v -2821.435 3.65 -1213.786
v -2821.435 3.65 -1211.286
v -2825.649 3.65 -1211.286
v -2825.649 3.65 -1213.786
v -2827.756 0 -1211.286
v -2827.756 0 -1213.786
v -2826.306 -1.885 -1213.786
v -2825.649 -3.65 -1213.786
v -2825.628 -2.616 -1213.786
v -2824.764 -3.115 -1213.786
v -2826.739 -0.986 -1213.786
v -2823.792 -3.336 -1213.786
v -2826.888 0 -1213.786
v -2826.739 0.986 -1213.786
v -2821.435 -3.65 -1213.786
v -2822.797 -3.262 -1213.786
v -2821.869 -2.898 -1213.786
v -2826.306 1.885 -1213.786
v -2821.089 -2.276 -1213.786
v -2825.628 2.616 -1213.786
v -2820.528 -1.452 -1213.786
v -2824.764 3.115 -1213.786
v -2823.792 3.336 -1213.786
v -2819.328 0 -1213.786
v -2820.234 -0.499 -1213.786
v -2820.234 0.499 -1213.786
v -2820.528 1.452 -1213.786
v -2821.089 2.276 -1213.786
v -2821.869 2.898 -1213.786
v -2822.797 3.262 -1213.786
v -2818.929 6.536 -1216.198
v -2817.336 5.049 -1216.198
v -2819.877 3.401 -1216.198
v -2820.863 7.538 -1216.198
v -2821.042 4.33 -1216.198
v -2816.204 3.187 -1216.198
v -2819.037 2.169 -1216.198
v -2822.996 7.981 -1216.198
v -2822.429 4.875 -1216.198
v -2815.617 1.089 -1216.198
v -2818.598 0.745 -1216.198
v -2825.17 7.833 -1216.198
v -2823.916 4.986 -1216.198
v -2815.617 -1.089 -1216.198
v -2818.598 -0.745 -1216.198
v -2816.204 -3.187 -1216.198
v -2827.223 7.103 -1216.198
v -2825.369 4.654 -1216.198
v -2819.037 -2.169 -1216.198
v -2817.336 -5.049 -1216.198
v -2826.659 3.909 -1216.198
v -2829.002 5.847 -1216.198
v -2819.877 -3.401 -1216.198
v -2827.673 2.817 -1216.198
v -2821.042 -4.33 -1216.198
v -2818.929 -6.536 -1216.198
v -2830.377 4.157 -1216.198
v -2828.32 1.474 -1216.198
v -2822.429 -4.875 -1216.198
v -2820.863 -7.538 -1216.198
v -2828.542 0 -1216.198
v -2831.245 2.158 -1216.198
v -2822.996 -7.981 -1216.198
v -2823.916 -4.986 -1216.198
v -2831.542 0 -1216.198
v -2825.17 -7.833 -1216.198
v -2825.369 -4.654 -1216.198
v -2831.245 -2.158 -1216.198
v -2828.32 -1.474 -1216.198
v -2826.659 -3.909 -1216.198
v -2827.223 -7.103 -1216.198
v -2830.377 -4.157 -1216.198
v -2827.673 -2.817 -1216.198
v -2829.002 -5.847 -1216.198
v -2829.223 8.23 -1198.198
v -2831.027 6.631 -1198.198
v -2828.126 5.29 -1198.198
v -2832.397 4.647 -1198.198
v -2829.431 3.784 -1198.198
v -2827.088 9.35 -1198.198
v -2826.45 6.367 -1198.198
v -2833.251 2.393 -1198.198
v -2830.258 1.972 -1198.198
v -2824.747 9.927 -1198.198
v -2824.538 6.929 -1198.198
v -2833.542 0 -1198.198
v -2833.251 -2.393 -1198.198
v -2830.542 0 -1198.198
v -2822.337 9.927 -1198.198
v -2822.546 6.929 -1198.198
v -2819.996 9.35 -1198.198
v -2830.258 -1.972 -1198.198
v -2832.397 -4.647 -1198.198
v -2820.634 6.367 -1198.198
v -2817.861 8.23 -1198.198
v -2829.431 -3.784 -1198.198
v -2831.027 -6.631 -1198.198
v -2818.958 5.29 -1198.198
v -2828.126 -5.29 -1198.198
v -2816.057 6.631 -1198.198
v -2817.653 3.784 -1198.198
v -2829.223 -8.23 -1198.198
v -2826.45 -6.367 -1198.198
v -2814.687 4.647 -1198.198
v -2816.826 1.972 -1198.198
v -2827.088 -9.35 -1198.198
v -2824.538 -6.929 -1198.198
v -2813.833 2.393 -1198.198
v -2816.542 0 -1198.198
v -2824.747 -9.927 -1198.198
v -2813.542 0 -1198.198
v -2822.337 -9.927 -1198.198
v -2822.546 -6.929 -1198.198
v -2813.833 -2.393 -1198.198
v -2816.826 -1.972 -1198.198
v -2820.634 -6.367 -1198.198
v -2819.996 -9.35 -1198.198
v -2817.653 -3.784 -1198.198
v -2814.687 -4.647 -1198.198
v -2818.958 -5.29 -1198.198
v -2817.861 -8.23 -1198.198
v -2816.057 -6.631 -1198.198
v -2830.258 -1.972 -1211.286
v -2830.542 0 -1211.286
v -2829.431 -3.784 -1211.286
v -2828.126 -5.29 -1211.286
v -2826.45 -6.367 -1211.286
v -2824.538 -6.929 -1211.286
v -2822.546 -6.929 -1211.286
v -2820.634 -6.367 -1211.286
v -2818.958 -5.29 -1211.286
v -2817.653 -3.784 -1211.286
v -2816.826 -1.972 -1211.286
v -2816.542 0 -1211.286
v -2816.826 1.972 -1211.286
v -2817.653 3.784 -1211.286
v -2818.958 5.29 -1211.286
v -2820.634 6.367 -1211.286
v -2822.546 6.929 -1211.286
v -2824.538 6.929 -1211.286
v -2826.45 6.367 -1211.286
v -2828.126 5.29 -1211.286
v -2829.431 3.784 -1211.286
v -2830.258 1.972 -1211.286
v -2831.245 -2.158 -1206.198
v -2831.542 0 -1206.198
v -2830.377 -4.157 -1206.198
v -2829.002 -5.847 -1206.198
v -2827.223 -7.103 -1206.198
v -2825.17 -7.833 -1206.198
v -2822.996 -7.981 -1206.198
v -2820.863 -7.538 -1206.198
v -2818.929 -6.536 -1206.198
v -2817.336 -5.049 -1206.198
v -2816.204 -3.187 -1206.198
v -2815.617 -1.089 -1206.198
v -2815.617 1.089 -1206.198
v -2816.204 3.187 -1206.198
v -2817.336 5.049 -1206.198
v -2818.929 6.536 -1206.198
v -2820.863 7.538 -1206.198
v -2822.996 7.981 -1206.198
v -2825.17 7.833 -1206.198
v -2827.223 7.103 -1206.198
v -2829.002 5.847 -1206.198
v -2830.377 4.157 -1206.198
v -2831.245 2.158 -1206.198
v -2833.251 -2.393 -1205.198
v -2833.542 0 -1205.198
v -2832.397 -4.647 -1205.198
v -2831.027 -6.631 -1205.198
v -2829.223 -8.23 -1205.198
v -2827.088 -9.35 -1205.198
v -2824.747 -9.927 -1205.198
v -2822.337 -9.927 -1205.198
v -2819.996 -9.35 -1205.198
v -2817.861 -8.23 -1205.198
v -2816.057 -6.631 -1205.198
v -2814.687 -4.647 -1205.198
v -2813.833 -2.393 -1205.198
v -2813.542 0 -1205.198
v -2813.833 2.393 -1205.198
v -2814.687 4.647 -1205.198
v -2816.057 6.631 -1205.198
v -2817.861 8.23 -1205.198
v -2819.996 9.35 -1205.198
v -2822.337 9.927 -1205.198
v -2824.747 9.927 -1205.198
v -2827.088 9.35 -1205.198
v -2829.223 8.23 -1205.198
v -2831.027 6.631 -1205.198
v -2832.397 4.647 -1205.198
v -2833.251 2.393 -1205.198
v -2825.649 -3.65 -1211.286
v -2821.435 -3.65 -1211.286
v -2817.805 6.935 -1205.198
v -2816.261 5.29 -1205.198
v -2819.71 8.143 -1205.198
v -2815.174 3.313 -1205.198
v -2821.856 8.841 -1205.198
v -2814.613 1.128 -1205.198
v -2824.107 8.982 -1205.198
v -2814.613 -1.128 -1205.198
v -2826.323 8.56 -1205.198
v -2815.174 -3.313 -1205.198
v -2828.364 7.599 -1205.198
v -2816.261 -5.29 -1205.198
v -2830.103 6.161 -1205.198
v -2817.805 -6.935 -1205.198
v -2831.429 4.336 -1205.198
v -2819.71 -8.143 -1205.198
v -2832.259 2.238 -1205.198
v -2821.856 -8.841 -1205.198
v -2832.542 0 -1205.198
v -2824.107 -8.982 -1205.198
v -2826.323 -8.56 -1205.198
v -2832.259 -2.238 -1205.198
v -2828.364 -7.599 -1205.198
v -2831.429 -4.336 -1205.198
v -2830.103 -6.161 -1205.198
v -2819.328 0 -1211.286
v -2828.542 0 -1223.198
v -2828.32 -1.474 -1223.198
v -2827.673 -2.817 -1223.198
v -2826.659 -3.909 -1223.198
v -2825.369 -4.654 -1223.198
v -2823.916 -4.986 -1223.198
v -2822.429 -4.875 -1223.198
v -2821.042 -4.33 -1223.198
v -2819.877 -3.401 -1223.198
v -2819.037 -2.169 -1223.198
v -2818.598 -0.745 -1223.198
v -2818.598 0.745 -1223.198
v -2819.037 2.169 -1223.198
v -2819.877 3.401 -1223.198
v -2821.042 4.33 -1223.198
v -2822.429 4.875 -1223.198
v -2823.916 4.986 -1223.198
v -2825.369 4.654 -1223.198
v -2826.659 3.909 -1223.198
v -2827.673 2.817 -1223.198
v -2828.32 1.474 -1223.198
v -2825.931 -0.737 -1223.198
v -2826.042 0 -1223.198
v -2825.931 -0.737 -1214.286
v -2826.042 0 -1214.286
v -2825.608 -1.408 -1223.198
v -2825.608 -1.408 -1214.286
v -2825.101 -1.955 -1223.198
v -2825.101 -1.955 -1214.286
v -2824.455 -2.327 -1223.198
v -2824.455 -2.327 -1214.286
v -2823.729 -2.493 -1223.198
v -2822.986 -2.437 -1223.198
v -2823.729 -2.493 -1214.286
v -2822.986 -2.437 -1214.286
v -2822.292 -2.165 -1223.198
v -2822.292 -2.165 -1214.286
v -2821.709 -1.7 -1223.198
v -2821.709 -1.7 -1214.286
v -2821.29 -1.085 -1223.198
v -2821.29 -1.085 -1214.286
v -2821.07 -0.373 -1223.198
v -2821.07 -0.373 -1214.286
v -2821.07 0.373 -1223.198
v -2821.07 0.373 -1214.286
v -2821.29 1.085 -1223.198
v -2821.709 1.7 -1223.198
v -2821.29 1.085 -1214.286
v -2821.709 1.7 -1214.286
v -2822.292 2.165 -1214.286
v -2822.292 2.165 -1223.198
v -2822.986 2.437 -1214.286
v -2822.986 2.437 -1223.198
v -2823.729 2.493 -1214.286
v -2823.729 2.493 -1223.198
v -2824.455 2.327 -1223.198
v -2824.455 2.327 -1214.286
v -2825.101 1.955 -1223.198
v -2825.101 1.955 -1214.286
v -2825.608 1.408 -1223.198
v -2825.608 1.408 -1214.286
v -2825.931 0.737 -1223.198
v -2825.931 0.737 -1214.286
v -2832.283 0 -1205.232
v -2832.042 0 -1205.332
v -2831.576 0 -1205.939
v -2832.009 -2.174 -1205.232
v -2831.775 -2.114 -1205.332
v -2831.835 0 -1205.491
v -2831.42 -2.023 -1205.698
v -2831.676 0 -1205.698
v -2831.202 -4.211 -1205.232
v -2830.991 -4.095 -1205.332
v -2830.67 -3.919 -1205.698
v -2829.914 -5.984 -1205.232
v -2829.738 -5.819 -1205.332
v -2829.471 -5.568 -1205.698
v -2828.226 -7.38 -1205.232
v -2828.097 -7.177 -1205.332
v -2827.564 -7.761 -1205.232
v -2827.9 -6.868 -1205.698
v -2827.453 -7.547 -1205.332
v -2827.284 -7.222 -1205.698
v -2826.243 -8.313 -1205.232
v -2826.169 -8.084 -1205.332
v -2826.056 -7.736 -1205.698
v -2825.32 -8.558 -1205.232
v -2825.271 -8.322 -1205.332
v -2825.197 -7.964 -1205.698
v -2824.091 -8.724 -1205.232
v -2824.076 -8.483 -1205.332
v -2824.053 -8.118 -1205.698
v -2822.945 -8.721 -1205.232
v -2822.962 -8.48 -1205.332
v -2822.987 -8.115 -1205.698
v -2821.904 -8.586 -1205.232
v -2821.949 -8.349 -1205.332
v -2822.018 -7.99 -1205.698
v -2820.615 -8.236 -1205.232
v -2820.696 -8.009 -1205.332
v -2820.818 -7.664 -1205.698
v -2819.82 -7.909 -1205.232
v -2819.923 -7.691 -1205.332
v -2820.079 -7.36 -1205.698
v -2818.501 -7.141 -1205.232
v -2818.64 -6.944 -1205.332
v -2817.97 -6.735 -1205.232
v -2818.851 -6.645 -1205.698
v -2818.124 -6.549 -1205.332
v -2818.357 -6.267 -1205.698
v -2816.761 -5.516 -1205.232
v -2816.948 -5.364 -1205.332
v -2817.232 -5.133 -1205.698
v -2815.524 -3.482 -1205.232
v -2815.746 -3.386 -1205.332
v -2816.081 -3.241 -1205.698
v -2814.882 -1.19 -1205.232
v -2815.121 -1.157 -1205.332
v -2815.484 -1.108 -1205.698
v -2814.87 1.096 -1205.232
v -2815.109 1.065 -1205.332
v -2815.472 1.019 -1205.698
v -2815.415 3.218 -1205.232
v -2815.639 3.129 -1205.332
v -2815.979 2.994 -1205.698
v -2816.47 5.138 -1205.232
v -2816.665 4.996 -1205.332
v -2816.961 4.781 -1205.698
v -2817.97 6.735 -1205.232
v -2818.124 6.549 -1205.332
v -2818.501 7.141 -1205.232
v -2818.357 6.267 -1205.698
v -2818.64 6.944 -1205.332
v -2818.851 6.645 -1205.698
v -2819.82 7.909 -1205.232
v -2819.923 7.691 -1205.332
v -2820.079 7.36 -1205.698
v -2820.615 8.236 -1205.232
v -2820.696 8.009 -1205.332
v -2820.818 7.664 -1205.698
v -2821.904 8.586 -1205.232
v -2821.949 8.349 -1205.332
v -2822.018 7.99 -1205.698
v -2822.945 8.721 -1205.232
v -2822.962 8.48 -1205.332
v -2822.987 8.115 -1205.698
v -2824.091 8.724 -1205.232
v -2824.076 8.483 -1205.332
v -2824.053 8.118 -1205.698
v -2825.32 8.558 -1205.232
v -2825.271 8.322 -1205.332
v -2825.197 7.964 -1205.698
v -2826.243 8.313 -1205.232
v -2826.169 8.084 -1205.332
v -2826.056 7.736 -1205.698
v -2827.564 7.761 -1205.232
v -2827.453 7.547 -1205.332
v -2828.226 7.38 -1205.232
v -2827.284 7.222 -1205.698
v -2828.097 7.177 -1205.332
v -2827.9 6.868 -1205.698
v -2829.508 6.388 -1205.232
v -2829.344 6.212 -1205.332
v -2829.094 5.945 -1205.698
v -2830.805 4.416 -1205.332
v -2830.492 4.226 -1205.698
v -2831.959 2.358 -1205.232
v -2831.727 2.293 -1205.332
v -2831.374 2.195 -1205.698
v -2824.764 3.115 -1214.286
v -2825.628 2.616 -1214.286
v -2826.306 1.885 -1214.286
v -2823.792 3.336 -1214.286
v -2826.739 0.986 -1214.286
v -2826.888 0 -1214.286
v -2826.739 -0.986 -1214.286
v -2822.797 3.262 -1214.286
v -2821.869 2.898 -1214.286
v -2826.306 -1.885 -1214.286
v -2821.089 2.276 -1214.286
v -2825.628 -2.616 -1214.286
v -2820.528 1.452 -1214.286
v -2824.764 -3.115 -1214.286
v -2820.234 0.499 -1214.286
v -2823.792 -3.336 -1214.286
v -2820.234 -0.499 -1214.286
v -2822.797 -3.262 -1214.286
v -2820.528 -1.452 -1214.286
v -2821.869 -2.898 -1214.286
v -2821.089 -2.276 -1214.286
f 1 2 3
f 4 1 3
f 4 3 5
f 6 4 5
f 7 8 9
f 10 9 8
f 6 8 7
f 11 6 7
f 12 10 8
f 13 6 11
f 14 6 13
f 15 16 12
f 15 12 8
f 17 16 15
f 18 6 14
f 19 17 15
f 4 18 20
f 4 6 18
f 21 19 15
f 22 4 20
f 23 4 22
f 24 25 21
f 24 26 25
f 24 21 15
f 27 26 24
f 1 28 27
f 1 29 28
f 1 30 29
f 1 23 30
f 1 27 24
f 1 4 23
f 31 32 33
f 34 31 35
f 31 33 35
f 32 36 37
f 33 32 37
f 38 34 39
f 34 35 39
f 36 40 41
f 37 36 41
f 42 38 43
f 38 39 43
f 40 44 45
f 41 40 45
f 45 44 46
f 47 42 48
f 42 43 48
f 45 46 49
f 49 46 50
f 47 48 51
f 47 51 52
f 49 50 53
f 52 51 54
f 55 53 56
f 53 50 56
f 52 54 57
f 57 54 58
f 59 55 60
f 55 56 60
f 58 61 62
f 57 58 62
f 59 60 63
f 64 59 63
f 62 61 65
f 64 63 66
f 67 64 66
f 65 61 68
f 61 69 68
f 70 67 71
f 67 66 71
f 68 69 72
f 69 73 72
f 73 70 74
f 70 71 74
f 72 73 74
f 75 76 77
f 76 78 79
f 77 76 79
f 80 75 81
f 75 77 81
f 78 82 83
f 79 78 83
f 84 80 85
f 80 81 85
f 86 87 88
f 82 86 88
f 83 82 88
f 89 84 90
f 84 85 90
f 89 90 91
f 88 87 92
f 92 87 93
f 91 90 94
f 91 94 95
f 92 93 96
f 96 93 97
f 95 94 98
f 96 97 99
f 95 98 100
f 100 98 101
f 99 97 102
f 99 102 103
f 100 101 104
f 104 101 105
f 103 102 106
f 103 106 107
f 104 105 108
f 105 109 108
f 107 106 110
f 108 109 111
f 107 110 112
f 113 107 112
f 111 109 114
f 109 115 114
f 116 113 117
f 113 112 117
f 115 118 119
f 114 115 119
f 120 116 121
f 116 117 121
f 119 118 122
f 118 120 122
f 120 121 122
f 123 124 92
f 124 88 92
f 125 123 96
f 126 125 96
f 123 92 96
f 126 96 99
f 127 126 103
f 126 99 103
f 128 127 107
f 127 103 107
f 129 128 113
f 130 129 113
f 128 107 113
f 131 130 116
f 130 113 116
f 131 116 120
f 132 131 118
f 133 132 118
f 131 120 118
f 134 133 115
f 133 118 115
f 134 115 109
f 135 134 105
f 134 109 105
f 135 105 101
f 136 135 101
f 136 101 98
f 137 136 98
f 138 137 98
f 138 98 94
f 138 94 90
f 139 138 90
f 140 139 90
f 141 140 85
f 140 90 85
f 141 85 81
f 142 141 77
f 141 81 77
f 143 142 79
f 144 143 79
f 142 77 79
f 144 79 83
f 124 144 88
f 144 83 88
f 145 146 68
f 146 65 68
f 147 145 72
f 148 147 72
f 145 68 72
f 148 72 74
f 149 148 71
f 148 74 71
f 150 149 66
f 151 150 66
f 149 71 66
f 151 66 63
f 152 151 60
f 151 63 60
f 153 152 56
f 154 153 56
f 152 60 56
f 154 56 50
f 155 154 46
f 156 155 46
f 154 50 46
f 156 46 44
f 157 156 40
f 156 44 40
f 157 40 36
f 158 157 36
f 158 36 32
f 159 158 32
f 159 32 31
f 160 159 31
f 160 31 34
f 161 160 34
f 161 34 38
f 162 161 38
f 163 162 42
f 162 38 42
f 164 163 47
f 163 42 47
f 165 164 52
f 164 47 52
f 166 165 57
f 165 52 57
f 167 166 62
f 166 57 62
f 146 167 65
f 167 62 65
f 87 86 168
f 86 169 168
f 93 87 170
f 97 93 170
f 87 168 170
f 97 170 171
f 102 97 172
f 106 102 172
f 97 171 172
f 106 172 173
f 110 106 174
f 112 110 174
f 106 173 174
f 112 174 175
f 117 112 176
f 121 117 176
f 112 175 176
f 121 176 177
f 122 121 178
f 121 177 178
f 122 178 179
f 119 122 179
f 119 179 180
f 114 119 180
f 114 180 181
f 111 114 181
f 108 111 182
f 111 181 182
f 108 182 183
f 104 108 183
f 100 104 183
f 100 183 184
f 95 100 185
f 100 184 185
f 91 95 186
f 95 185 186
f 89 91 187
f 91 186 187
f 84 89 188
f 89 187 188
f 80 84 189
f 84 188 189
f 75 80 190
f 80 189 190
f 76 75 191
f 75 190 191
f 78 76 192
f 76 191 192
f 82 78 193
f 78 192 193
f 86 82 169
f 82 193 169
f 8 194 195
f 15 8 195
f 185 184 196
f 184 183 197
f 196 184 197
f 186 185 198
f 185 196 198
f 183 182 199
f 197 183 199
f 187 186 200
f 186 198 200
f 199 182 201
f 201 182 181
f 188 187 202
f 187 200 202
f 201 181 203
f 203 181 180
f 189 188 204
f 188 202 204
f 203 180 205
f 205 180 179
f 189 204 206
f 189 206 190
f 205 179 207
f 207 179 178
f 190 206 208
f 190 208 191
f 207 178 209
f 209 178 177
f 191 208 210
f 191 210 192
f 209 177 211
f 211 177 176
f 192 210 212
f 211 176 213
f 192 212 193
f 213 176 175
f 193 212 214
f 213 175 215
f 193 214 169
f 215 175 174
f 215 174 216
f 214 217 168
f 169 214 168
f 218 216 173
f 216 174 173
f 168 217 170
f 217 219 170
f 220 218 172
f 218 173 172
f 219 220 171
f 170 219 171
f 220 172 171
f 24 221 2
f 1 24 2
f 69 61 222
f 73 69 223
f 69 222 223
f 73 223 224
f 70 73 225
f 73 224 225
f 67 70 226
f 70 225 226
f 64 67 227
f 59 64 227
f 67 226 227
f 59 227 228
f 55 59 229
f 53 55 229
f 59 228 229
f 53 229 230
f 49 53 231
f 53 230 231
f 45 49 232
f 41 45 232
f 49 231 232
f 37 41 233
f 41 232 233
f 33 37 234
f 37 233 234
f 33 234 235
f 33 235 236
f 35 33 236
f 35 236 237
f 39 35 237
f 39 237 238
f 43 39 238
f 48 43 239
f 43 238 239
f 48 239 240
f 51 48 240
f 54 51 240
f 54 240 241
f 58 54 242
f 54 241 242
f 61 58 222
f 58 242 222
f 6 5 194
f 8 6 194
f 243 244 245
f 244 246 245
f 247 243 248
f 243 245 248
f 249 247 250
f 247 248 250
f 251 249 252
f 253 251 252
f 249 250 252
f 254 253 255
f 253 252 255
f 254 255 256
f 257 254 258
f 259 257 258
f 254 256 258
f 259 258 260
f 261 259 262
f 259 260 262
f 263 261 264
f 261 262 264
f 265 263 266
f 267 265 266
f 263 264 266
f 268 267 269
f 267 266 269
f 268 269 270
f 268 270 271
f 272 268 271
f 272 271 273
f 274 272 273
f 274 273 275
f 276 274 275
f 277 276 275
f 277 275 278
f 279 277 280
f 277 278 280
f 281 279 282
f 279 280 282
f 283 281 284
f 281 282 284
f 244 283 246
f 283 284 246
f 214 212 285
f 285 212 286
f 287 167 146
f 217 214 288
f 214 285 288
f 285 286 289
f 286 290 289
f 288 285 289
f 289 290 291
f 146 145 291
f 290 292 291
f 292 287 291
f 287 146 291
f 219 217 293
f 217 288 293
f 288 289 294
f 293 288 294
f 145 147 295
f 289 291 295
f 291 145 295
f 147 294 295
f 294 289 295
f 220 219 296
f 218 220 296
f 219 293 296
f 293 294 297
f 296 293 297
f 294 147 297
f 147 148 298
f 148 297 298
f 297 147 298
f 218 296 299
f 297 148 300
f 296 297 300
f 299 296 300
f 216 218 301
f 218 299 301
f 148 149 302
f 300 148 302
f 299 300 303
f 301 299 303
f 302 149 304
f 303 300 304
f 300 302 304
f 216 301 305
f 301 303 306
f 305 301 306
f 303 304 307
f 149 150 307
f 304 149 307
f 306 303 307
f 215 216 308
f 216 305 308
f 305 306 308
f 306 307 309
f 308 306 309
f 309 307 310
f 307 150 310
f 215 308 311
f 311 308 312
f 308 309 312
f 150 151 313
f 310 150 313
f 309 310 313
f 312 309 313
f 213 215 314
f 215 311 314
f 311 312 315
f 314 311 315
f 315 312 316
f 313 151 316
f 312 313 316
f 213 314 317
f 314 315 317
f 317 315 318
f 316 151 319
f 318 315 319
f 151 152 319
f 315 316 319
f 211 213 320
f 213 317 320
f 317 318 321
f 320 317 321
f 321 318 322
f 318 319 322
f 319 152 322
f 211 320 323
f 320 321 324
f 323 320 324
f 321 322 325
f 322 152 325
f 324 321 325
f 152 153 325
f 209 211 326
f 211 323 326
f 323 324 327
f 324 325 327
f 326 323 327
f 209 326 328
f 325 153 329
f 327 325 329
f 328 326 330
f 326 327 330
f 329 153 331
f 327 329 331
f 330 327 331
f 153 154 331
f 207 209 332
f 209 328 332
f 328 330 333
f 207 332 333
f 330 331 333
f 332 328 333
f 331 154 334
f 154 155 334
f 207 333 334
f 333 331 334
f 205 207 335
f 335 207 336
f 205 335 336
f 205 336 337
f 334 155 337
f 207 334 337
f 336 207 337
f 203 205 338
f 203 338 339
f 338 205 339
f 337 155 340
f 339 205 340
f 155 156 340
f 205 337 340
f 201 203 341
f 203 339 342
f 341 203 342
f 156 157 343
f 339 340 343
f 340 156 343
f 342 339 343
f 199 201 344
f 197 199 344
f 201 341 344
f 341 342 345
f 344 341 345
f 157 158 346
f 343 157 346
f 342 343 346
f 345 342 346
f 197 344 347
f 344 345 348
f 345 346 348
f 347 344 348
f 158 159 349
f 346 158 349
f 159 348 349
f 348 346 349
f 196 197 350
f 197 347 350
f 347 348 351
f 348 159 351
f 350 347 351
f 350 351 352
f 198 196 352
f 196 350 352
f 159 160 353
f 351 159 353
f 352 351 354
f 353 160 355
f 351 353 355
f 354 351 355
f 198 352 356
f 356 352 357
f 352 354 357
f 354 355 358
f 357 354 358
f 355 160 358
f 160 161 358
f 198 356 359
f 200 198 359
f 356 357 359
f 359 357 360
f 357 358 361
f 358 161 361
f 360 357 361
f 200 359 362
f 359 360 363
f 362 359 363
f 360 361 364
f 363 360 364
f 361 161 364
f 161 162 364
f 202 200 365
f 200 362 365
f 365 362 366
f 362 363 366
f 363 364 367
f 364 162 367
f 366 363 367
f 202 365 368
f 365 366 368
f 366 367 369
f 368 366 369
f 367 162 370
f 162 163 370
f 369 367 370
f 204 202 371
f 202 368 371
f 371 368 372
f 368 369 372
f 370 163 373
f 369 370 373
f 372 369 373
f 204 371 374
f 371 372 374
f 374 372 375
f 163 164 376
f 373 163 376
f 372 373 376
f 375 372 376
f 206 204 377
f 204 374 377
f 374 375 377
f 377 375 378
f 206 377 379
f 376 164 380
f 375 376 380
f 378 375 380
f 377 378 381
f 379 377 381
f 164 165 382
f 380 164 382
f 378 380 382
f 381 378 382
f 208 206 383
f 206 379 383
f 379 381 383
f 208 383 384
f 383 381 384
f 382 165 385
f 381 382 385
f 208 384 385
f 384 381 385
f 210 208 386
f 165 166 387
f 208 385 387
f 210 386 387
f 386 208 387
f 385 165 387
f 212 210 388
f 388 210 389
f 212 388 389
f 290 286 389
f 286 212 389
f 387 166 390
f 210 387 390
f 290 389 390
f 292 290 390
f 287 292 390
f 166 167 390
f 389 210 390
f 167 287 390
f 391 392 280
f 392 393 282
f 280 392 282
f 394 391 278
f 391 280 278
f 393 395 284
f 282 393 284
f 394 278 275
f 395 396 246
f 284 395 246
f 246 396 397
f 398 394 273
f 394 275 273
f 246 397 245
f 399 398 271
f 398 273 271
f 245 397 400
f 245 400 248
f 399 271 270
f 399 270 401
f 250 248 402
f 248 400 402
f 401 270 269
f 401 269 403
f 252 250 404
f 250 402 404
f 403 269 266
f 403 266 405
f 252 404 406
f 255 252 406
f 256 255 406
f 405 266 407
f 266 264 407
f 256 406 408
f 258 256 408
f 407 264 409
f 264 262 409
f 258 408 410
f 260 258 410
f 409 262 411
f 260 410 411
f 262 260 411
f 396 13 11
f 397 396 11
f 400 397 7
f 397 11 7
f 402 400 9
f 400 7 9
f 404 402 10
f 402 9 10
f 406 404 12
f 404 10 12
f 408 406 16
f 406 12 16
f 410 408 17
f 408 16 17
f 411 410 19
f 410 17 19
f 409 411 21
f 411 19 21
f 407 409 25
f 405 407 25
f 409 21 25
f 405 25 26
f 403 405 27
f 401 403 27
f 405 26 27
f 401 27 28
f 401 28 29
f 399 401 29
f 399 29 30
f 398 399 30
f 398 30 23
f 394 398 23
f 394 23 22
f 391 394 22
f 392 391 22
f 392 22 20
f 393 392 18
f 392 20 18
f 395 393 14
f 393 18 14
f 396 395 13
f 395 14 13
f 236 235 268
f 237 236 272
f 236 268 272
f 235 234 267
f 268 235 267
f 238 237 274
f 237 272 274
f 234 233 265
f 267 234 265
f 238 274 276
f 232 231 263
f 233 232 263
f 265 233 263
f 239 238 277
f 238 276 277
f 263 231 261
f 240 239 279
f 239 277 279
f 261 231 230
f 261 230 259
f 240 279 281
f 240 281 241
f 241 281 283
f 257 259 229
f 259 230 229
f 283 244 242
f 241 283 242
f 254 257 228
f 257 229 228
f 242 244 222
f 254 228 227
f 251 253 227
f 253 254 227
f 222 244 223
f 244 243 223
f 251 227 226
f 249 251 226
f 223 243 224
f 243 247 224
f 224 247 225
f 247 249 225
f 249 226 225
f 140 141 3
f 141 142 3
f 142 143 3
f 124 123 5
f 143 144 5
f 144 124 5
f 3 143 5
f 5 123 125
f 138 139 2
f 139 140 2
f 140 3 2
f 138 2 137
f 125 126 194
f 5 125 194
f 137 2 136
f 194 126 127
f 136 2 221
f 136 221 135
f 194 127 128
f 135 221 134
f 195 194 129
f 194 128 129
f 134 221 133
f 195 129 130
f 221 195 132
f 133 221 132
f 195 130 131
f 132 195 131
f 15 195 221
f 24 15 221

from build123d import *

# Parameters (mm, degrees)
CUT_EXTRUDE2_DEPTH = 2.5


with BuildPart() as part:
    # Sketch1 → Revolve1 (revolve)
    with BuildSketch(Plane(origin=(0, 0, 0), x_dir=(1, 0, 0), z_dir=(0, 1, 0)), mode=Mode.PRIVATE) as revolve1_sk:
        with BuildLine():
            Line((-2818.542001076, 1216.198145417), (-2818.542001076, 1223.198145417))
            Line((-2818.542001076, 1223.198145417), (-2821.042001076, 1223.198145417))
            Line((-2821.042001076, 1223.198145417), (-2821.042001076, 1214.285550771))
            Line((-2821.042001076, 1214.285550771), (-2820.196168753, 1214.285550771))
            Line((-2820.196168753, 1214.285550771), (-2820.196168753, 1211.285550771))
            Line((-2820.196168753, 1211.285550771), (-2818.542001076, 1211.285550771))
            Line((-2818.542001076, 1211.285550771), (-2816.542001076, 1211.285550771))
            Line((-2816.542001076, 1211.285550771), (-2816.542001076, 1198.198145417))
            Line((-2816.542001076, 1198.198145417), (-2813.542001076, 1198.198145417))
            Line((-2813.542001076, 1198.198145417), (-2813.542001076, 1205.198145417))
            Line((-2813.542001076, 1205.198145417), (-2814.542001076, 1205.198145417))
            ThreePointArc((-2814.542001076, 1205.198145417), (-2815.249107857, 1205.491038636), (-2815.542001076, 1206.198145417))
            Line((-2815.542001076, 1206.198145417), (-2815.542001076, 1216.198145417))
            Line((-2815.542001076, 1216.198145417), (-2818.542001076, 1216.198145417))
        make_face()
    revolve(revolve1_sk.sketch.rotate(Axis((-2823.542001076, 0, -1216.198145417), (0, 0, 1)), 180), axis=Axis((-2823.542001076, 0, -1216.198145417), (0, 0, 1)))

    # Sketch2 → Cut-Extrude2 (cut)
    with BuildSketch(Plane.XY.offset(-1211.285550771)):
        Polygon((-2819.327722789, 0), (-2821.434861933, 3.649672055), (-2825.649140219, 3.649672055), (-2827.756279362, 0), (-2825.649140219, -3.649672055), (-2821.434861933, -3.649672055), align=None)
    extrude(amount=-CUT_EXTRUDE2_DEPTH, mode=Mode.SUBTRACT)


solid = part.part
